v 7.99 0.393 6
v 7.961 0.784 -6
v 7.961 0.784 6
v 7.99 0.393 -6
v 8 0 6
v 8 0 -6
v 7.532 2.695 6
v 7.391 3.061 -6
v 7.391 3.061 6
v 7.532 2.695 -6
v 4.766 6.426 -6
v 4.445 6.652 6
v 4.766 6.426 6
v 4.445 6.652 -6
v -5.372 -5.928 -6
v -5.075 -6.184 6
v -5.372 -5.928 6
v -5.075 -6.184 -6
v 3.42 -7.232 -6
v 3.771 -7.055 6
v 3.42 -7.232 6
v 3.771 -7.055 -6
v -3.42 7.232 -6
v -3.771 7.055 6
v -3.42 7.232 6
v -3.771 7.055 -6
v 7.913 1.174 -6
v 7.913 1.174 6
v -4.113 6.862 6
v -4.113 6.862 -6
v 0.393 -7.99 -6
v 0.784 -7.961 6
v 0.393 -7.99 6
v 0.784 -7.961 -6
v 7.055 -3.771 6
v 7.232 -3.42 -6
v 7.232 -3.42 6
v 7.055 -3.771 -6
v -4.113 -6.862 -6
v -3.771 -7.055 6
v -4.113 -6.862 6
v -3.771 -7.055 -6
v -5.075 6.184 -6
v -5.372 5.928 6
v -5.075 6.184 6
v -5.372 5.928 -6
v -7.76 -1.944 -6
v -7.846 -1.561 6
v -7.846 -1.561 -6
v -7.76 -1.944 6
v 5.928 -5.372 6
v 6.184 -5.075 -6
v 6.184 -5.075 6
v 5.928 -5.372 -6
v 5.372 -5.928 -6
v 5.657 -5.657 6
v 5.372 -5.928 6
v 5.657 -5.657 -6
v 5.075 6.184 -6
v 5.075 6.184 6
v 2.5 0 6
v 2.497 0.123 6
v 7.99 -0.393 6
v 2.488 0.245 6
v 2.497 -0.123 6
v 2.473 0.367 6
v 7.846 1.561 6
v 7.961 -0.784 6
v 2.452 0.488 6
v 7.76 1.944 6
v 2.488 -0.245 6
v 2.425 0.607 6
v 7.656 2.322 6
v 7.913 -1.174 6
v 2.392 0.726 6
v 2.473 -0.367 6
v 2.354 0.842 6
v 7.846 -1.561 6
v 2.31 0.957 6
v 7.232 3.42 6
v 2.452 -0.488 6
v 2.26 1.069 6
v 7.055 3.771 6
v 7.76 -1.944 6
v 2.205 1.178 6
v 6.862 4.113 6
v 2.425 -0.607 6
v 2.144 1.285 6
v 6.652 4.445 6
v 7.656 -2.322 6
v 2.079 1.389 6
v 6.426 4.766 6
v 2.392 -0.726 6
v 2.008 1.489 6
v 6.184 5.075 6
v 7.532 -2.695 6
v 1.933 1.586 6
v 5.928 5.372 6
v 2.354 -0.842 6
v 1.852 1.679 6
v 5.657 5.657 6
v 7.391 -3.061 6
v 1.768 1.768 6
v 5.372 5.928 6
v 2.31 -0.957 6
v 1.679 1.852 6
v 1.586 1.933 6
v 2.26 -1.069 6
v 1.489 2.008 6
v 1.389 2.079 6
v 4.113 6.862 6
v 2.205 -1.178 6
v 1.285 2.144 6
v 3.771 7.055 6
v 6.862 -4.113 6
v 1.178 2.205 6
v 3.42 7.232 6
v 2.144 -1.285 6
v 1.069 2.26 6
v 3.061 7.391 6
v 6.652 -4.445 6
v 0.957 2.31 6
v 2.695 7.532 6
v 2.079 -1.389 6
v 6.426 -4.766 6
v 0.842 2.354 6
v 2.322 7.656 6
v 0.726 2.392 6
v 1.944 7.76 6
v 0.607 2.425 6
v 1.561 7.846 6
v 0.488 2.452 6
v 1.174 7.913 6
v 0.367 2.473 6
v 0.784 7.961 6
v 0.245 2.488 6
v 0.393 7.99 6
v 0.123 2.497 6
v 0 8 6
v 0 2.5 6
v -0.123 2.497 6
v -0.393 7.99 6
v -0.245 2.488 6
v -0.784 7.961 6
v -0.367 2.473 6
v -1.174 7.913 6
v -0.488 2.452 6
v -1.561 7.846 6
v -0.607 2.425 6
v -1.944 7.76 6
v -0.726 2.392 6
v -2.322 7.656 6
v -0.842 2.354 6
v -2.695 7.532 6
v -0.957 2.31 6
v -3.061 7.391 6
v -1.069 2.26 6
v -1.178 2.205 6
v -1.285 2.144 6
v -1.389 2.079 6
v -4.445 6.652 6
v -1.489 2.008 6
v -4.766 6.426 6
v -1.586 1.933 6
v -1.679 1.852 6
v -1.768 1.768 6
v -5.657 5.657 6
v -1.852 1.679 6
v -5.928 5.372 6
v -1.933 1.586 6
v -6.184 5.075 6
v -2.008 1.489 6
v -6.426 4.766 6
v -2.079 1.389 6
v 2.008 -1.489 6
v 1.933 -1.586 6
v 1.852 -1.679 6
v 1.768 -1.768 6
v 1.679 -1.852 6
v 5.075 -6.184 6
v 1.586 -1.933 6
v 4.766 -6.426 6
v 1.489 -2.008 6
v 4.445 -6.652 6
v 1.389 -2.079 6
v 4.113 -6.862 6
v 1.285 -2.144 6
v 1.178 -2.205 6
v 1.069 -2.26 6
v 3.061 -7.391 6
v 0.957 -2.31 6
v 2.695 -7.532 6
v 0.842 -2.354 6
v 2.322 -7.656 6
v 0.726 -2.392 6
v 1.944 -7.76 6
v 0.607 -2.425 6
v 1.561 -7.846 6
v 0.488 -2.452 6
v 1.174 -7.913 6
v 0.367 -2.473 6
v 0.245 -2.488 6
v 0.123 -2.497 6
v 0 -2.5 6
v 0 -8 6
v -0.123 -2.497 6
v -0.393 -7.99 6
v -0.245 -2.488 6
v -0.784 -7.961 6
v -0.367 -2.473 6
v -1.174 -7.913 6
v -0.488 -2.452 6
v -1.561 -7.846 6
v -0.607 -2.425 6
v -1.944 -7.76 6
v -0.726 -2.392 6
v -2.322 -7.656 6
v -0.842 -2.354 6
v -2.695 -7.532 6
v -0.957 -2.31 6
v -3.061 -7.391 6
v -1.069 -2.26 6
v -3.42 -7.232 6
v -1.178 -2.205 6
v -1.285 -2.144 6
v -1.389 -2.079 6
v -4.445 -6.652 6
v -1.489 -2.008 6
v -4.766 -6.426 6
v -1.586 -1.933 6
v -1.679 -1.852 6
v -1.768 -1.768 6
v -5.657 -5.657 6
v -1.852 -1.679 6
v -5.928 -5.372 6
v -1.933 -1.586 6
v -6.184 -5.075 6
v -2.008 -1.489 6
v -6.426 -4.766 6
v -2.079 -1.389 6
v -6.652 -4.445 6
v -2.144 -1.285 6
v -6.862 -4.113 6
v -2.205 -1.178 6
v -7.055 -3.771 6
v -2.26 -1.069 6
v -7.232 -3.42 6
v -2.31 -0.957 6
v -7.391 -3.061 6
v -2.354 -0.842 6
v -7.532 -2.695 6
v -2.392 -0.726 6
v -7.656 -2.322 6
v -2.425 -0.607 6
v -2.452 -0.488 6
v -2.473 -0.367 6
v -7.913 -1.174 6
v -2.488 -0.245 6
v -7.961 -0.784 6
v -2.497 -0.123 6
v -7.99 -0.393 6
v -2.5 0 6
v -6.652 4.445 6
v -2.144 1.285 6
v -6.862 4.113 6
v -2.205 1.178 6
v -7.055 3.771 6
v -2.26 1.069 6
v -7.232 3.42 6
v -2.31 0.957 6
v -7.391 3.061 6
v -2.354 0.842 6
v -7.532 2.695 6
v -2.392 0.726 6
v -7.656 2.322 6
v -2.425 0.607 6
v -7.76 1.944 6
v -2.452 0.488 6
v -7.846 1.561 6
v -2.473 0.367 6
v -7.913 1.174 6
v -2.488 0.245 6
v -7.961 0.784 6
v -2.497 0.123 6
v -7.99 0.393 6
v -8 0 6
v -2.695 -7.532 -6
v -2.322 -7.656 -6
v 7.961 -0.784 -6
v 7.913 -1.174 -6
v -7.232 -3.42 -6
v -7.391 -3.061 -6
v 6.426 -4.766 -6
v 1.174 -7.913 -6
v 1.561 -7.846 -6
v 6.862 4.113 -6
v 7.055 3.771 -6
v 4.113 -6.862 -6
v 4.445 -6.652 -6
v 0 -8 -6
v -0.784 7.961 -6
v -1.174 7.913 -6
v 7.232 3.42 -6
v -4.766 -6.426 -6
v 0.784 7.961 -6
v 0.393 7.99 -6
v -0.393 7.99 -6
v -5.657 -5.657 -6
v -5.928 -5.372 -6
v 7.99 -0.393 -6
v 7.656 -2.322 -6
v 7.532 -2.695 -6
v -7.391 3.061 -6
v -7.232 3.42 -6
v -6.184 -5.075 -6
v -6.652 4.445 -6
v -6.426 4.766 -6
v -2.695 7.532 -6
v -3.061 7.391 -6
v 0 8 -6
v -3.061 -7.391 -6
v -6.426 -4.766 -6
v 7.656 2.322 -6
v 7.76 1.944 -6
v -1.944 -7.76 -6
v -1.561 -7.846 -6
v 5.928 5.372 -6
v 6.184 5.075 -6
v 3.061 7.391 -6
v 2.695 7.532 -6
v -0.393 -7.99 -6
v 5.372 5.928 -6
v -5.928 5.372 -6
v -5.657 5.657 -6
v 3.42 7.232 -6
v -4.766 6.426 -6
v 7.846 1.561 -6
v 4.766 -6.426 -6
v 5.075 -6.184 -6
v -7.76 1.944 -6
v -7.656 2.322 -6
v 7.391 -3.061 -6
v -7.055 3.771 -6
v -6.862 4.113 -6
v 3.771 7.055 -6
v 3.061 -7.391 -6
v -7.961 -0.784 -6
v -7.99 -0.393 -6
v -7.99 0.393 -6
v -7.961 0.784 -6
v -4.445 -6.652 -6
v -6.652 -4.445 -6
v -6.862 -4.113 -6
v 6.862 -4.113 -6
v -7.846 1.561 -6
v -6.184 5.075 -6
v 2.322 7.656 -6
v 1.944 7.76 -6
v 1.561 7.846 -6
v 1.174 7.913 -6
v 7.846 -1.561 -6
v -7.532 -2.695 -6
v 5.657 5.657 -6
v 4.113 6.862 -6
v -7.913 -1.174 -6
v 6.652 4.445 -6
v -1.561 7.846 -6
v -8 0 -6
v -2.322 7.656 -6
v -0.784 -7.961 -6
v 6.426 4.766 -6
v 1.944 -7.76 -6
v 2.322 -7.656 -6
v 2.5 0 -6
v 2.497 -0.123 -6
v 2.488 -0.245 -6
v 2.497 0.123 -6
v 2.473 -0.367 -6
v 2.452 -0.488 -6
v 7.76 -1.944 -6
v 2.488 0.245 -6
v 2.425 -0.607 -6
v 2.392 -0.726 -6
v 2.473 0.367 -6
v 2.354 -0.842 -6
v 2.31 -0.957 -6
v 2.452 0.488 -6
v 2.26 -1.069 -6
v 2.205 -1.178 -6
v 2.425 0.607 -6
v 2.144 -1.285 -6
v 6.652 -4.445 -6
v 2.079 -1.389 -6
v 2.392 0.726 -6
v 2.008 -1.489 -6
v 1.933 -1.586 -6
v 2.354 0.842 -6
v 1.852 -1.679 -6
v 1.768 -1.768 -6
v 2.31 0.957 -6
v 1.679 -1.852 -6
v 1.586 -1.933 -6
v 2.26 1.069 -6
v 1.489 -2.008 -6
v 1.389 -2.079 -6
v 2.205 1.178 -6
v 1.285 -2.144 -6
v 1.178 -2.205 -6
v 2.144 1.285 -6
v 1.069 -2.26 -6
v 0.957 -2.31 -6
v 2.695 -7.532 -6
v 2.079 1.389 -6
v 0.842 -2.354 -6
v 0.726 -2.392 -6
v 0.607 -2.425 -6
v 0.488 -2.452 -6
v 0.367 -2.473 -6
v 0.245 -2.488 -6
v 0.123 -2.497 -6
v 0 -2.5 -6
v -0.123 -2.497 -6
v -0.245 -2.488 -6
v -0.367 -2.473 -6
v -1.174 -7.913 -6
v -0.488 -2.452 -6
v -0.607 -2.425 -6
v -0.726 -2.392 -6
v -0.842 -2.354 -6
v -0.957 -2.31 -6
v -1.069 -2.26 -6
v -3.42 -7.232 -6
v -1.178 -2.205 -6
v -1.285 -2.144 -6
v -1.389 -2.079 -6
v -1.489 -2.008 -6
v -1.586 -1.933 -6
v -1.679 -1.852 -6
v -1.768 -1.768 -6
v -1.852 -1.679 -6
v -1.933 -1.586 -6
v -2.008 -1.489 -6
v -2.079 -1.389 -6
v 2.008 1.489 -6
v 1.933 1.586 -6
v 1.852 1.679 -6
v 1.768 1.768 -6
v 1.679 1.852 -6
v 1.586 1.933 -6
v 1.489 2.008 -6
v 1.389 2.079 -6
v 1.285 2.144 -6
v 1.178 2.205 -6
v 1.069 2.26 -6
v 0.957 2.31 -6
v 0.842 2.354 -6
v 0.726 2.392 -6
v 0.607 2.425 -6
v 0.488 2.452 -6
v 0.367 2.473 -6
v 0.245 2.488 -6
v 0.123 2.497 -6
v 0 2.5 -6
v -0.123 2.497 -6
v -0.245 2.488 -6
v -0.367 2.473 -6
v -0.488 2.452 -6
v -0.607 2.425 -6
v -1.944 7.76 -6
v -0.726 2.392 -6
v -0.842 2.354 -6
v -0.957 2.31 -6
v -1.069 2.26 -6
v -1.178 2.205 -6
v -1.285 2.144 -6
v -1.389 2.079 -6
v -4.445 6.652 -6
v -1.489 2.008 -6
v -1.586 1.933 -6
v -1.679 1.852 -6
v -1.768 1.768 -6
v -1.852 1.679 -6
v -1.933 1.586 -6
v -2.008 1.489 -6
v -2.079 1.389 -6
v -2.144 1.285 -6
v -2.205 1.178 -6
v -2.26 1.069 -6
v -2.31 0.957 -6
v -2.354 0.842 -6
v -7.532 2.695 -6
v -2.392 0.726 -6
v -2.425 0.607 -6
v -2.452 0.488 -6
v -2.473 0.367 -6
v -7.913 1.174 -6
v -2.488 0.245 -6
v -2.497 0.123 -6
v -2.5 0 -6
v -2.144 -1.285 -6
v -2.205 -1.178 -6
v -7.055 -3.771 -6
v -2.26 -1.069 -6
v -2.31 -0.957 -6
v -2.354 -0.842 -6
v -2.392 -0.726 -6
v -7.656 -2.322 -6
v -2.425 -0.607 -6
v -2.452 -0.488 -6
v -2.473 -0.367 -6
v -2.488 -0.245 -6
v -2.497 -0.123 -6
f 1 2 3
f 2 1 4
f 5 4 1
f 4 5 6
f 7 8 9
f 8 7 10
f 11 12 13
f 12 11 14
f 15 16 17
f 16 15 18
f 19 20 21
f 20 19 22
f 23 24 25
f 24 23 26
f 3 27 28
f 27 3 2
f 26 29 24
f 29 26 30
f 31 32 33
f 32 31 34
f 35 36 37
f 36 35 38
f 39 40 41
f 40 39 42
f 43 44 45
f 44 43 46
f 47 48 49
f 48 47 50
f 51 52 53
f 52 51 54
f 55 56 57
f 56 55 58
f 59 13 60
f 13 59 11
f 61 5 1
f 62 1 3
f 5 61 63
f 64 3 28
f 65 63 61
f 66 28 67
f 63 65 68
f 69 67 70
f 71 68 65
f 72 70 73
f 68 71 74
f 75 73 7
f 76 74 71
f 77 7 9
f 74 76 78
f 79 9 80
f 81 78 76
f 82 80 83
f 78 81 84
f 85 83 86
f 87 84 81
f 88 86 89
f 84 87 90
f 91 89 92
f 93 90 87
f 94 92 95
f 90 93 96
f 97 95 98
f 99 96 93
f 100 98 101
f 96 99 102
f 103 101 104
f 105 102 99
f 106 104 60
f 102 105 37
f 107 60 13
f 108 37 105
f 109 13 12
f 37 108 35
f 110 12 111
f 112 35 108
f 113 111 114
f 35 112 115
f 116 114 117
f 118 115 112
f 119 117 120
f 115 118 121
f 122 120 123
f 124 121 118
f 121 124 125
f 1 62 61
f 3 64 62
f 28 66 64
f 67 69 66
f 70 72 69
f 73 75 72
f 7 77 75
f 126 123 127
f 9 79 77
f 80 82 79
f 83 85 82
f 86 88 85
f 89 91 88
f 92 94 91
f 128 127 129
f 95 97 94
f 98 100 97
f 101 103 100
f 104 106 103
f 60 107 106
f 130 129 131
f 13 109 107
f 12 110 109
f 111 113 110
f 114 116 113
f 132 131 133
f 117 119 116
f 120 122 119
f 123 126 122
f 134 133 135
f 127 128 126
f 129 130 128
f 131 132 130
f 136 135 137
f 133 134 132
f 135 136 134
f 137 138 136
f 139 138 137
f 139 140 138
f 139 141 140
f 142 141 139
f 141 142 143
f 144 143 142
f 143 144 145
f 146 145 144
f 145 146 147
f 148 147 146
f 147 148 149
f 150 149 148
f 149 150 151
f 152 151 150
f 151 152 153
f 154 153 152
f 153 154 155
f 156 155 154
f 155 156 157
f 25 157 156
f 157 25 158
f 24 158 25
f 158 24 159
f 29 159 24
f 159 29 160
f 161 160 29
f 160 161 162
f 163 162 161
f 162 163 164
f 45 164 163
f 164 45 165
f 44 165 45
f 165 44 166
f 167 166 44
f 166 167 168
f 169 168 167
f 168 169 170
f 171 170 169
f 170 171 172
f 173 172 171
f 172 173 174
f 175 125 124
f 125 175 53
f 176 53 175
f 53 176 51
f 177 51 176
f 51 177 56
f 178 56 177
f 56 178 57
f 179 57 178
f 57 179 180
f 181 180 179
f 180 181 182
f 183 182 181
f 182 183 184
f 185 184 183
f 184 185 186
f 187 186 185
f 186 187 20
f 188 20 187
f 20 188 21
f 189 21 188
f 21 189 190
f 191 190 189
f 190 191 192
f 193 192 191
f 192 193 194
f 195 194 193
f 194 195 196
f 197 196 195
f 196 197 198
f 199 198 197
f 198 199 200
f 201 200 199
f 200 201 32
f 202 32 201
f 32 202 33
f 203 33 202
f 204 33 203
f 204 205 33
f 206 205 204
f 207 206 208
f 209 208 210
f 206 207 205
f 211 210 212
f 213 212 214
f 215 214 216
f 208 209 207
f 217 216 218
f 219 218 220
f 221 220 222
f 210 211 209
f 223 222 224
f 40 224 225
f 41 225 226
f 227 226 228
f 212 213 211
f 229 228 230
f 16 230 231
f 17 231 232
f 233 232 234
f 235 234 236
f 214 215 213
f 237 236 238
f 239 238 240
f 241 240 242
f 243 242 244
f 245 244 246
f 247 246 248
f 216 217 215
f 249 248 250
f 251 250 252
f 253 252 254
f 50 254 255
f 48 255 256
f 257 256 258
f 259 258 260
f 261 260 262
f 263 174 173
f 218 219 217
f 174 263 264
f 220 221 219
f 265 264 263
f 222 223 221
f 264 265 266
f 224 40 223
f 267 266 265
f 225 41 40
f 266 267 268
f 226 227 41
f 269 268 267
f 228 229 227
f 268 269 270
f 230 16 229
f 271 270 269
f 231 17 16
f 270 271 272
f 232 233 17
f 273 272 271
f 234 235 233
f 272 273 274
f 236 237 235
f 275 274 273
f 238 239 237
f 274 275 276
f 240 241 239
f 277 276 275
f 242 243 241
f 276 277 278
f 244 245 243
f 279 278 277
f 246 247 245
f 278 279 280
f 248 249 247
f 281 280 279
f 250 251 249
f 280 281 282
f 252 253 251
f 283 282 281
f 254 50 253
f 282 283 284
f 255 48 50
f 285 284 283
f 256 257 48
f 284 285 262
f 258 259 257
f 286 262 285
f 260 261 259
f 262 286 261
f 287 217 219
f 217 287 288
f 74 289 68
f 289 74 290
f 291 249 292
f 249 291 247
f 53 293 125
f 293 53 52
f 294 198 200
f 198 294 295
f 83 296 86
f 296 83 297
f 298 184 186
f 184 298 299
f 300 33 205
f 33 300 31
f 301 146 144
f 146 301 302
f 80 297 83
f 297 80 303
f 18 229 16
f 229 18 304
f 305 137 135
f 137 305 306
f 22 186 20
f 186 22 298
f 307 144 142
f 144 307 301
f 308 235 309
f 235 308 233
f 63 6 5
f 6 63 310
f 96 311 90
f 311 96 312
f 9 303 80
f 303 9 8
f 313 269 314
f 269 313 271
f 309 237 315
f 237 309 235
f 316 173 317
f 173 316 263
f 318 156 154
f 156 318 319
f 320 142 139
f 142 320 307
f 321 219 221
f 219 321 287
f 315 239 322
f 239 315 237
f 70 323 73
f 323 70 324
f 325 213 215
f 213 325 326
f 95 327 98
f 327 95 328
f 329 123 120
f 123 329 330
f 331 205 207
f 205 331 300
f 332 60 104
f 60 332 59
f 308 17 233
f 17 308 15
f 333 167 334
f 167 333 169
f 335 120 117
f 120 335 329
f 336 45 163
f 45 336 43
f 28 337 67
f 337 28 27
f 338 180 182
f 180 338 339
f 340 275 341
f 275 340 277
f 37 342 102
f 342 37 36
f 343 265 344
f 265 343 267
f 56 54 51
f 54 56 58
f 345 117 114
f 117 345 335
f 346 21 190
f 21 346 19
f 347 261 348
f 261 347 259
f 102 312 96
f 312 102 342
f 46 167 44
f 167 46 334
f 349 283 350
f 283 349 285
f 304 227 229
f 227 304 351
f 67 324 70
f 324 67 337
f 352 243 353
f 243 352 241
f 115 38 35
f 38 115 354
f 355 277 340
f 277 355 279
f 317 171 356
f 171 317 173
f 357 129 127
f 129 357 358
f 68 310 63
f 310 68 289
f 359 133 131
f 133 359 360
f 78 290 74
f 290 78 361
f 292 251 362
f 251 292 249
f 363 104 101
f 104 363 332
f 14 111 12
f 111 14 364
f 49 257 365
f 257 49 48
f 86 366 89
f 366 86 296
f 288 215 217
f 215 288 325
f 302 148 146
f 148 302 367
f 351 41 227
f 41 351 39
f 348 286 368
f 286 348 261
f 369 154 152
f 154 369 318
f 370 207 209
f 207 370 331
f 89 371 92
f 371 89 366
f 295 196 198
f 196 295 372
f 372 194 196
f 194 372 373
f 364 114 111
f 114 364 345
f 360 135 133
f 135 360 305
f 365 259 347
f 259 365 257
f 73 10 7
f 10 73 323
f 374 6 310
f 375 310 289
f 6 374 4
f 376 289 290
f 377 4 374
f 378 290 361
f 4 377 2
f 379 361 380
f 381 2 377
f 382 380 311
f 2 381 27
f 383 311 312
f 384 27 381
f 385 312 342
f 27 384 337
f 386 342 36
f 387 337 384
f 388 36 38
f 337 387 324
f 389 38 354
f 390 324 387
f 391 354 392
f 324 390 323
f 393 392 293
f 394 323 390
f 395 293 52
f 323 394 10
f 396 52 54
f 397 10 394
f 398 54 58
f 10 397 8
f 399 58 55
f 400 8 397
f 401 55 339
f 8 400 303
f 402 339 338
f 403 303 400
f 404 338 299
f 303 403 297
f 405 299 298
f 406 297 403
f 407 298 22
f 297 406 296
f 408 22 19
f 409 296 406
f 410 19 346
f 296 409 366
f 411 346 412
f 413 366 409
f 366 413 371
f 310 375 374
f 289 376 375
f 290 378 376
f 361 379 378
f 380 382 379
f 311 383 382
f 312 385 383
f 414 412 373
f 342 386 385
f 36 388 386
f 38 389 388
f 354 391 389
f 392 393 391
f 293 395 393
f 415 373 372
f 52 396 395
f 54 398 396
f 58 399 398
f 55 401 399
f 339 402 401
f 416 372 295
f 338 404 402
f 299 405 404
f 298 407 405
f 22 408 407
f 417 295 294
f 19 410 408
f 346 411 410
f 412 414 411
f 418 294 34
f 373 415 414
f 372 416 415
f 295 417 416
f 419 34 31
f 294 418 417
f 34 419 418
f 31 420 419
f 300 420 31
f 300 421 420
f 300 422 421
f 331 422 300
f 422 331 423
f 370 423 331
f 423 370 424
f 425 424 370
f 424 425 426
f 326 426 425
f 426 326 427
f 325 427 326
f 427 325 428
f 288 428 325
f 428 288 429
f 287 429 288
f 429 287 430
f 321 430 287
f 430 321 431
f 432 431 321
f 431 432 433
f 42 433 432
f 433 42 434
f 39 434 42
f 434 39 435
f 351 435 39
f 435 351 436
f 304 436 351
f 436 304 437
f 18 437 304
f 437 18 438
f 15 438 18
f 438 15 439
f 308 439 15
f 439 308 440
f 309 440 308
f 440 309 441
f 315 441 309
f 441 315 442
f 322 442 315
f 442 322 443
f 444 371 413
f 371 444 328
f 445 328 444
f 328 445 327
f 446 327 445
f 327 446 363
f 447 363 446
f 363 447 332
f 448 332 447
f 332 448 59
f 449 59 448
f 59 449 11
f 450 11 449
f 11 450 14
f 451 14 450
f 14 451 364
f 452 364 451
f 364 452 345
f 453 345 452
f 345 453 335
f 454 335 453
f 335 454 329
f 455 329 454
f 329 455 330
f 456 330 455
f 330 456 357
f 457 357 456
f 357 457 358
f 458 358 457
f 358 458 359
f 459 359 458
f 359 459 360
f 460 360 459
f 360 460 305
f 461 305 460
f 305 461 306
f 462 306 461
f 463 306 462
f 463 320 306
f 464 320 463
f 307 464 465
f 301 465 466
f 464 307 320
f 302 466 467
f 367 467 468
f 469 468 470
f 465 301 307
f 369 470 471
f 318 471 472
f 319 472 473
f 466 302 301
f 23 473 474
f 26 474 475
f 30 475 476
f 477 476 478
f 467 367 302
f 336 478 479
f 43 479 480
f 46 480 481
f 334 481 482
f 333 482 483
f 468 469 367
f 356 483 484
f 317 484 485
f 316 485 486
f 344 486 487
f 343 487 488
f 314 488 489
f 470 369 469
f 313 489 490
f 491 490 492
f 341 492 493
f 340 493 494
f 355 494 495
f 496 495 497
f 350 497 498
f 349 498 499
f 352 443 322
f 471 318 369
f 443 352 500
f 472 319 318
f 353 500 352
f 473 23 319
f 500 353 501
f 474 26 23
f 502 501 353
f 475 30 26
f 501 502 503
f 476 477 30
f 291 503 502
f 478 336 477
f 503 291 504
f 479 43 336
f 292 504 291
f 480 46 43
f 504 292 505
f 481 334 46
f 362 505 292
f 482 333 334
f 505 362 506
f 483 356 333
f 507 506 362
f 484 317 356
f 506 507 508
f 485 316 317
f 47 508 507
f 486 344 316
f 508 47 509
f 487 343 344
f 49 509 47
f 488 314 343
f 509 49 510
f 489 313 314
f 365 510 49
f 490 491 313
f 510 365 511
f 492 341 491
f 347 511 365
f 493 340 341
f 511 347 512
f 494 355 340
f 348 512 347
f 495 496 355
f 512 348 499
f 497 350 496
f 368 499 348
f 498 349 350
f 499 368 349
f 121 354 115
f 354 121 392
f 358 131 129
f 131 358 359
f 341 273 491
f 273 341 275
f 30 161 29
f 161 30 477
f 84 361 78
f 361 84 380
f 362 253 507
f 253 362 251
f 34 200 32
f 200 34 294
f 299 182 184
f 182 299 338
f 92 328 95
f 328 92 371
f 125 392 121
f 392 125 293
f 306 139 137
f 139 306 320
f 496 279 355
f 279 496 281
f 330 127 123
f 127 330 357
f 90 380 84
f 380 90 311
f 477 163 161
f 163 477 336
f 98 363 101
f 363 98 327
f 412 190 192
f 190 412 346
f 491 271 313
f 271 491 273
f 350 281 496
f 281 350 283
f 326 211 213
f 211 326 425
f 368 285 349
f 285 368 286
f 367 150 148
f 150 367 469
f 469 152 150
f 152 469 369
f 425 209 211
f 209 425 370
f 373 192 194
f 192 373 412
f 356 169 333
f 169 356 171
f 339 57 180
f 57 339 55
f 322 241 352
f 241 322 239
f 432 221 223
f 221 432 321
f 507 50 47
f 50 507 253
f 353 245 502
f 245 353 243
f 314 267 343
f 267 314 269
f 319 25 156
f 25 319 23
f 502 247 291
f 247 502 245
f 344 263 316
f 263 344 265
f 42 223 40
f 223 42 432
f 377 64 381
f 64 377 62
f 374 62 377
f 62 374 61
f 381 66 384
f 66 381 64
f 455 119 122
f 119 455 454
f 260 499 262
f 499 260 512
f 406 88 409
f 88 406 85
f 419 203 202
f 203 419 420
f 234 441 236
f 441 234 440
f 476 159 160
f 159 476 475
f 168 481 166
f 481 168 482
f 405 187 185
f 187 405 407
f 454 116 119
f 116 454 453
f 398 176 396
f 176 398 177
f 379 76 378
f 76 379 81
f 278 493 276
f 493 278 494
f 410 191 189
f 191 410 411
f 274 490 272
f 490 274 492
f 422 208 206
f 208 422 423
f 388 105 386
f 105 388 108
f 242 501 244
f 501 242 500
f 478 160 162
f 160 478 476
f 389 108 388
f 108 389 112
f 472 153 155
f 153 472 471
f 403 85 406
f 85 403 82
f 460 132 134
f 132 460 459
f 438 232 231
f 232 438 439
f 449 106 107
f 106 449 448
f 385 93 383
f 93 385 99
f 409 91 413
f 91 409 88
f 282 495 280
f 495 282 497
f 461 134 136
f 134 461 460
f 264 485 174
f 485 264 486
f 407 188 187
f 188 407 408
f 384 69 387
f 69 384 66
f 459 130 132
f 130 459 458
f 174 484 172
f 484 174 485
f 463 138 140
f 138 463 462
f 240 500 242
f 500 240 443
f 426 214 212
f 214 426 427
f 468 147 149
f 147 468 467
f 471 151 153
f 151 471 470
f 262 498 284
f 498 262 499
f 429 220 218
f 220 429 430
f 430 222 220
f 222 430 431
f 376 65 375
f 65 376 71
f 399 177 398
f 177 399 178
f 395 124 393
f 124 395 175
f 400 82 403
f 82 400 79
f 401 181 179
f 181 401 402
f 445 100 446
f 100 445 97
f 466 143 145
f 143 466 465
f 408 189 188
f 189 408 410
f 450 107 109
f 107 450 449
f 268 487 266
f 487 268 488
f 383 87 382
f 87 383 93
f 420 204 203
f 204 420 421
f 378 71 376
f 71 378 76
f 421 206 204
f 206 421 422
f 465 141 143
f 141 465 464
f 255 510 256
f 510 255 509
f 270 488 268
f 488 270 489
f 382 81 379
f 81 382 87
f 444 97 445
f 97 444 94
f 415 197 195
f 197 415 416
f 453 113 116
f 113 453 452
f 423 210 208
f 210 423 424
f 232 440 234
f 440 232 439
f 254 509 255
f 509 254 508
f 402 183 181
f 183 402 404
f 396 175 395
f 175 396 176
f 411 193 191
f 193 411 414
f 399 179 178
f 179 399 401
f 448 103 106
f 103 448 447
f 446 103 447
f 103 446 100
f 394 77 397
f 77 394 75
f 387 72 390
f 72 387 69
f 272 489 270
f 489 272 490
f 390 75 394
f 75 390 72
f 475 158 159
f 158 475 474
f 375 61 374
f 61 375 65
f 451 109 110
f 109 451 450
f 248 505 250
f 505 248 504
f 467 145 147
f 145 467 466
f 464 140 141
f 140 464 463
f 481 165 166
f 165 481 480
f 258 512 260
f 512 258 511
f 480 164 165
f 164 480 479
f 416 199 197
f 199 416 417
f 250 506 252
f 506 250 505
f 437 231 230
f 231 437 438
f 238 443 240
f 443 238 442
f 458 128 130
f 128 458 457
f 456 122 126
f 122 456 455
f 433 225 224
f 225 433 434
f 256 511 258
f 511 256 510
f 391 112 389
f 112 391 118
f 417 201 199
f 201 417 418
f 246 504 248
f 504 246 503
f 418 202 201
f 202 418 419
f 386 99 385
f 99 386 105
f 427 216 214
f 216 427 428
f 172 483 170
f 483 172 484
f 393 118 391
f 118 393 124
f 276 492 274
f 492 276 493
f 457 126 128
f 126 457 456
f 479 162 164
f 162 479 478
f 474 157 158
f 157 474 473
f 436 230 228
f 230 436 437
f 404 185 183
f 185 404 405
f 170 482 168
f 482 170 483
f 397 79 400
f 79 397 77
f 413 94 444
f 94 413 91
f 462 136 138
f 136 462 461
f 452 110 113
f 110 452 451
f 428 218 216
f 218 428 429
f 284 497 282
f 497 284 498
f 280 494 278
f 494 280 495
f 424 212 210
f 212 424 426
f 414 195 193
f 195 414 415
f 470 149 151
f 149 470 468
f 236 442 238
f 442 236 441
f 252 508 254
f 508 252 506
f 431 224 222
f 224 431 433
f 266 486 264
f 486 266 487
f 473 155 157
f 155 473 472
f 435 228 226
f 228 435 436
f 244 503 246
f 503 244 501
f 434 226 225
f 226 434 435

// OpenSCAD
$fn=128;

teeth = 20;
pitch_d = 12.22;
pitch_r = pitch_d/2;

pulley_width = 10;
hub_d = 16;
hub_width = 12;

bore_d = 5;

tooth_height = 1.2;
tooth_tip_width = 1.2;
tooth_root_width = 2.0;

root_r = pitch_r - tooth_height/2;
tip_r  = pitch_r + tooth_height/2;

module tooth2d() {
    polygon(points=[
        [root_r, -tooth_root_width/2],
        [root_r,  tooth_root_width/2],
        [tip_r,   tooth_tip_width/2],
        [tip_r,  -tooth_tip_width/2]
    ]);
}

module teeth_ring() {
    for(i=[0:teeth-1]) {
        rotate([0,0, i*360/teeth])
            linear_extrude(height=pulley_width, center=true, convexity=10)
                tooth2d();
    }
}

module pulley_body() {
    union() {
        cylinder(d=2*root_r, h=pulley_width, center=true);
        teeth_ring();
    }
}

module hub() {
    cylinder(d=hub_d, h=hub_width, center=true);
}

difference() {
    union() {
        pulley_body();
        hub();
    }
    cylinder(d=bore_d, h=max(pulley_width, hub_width)+2, center=true);
}
